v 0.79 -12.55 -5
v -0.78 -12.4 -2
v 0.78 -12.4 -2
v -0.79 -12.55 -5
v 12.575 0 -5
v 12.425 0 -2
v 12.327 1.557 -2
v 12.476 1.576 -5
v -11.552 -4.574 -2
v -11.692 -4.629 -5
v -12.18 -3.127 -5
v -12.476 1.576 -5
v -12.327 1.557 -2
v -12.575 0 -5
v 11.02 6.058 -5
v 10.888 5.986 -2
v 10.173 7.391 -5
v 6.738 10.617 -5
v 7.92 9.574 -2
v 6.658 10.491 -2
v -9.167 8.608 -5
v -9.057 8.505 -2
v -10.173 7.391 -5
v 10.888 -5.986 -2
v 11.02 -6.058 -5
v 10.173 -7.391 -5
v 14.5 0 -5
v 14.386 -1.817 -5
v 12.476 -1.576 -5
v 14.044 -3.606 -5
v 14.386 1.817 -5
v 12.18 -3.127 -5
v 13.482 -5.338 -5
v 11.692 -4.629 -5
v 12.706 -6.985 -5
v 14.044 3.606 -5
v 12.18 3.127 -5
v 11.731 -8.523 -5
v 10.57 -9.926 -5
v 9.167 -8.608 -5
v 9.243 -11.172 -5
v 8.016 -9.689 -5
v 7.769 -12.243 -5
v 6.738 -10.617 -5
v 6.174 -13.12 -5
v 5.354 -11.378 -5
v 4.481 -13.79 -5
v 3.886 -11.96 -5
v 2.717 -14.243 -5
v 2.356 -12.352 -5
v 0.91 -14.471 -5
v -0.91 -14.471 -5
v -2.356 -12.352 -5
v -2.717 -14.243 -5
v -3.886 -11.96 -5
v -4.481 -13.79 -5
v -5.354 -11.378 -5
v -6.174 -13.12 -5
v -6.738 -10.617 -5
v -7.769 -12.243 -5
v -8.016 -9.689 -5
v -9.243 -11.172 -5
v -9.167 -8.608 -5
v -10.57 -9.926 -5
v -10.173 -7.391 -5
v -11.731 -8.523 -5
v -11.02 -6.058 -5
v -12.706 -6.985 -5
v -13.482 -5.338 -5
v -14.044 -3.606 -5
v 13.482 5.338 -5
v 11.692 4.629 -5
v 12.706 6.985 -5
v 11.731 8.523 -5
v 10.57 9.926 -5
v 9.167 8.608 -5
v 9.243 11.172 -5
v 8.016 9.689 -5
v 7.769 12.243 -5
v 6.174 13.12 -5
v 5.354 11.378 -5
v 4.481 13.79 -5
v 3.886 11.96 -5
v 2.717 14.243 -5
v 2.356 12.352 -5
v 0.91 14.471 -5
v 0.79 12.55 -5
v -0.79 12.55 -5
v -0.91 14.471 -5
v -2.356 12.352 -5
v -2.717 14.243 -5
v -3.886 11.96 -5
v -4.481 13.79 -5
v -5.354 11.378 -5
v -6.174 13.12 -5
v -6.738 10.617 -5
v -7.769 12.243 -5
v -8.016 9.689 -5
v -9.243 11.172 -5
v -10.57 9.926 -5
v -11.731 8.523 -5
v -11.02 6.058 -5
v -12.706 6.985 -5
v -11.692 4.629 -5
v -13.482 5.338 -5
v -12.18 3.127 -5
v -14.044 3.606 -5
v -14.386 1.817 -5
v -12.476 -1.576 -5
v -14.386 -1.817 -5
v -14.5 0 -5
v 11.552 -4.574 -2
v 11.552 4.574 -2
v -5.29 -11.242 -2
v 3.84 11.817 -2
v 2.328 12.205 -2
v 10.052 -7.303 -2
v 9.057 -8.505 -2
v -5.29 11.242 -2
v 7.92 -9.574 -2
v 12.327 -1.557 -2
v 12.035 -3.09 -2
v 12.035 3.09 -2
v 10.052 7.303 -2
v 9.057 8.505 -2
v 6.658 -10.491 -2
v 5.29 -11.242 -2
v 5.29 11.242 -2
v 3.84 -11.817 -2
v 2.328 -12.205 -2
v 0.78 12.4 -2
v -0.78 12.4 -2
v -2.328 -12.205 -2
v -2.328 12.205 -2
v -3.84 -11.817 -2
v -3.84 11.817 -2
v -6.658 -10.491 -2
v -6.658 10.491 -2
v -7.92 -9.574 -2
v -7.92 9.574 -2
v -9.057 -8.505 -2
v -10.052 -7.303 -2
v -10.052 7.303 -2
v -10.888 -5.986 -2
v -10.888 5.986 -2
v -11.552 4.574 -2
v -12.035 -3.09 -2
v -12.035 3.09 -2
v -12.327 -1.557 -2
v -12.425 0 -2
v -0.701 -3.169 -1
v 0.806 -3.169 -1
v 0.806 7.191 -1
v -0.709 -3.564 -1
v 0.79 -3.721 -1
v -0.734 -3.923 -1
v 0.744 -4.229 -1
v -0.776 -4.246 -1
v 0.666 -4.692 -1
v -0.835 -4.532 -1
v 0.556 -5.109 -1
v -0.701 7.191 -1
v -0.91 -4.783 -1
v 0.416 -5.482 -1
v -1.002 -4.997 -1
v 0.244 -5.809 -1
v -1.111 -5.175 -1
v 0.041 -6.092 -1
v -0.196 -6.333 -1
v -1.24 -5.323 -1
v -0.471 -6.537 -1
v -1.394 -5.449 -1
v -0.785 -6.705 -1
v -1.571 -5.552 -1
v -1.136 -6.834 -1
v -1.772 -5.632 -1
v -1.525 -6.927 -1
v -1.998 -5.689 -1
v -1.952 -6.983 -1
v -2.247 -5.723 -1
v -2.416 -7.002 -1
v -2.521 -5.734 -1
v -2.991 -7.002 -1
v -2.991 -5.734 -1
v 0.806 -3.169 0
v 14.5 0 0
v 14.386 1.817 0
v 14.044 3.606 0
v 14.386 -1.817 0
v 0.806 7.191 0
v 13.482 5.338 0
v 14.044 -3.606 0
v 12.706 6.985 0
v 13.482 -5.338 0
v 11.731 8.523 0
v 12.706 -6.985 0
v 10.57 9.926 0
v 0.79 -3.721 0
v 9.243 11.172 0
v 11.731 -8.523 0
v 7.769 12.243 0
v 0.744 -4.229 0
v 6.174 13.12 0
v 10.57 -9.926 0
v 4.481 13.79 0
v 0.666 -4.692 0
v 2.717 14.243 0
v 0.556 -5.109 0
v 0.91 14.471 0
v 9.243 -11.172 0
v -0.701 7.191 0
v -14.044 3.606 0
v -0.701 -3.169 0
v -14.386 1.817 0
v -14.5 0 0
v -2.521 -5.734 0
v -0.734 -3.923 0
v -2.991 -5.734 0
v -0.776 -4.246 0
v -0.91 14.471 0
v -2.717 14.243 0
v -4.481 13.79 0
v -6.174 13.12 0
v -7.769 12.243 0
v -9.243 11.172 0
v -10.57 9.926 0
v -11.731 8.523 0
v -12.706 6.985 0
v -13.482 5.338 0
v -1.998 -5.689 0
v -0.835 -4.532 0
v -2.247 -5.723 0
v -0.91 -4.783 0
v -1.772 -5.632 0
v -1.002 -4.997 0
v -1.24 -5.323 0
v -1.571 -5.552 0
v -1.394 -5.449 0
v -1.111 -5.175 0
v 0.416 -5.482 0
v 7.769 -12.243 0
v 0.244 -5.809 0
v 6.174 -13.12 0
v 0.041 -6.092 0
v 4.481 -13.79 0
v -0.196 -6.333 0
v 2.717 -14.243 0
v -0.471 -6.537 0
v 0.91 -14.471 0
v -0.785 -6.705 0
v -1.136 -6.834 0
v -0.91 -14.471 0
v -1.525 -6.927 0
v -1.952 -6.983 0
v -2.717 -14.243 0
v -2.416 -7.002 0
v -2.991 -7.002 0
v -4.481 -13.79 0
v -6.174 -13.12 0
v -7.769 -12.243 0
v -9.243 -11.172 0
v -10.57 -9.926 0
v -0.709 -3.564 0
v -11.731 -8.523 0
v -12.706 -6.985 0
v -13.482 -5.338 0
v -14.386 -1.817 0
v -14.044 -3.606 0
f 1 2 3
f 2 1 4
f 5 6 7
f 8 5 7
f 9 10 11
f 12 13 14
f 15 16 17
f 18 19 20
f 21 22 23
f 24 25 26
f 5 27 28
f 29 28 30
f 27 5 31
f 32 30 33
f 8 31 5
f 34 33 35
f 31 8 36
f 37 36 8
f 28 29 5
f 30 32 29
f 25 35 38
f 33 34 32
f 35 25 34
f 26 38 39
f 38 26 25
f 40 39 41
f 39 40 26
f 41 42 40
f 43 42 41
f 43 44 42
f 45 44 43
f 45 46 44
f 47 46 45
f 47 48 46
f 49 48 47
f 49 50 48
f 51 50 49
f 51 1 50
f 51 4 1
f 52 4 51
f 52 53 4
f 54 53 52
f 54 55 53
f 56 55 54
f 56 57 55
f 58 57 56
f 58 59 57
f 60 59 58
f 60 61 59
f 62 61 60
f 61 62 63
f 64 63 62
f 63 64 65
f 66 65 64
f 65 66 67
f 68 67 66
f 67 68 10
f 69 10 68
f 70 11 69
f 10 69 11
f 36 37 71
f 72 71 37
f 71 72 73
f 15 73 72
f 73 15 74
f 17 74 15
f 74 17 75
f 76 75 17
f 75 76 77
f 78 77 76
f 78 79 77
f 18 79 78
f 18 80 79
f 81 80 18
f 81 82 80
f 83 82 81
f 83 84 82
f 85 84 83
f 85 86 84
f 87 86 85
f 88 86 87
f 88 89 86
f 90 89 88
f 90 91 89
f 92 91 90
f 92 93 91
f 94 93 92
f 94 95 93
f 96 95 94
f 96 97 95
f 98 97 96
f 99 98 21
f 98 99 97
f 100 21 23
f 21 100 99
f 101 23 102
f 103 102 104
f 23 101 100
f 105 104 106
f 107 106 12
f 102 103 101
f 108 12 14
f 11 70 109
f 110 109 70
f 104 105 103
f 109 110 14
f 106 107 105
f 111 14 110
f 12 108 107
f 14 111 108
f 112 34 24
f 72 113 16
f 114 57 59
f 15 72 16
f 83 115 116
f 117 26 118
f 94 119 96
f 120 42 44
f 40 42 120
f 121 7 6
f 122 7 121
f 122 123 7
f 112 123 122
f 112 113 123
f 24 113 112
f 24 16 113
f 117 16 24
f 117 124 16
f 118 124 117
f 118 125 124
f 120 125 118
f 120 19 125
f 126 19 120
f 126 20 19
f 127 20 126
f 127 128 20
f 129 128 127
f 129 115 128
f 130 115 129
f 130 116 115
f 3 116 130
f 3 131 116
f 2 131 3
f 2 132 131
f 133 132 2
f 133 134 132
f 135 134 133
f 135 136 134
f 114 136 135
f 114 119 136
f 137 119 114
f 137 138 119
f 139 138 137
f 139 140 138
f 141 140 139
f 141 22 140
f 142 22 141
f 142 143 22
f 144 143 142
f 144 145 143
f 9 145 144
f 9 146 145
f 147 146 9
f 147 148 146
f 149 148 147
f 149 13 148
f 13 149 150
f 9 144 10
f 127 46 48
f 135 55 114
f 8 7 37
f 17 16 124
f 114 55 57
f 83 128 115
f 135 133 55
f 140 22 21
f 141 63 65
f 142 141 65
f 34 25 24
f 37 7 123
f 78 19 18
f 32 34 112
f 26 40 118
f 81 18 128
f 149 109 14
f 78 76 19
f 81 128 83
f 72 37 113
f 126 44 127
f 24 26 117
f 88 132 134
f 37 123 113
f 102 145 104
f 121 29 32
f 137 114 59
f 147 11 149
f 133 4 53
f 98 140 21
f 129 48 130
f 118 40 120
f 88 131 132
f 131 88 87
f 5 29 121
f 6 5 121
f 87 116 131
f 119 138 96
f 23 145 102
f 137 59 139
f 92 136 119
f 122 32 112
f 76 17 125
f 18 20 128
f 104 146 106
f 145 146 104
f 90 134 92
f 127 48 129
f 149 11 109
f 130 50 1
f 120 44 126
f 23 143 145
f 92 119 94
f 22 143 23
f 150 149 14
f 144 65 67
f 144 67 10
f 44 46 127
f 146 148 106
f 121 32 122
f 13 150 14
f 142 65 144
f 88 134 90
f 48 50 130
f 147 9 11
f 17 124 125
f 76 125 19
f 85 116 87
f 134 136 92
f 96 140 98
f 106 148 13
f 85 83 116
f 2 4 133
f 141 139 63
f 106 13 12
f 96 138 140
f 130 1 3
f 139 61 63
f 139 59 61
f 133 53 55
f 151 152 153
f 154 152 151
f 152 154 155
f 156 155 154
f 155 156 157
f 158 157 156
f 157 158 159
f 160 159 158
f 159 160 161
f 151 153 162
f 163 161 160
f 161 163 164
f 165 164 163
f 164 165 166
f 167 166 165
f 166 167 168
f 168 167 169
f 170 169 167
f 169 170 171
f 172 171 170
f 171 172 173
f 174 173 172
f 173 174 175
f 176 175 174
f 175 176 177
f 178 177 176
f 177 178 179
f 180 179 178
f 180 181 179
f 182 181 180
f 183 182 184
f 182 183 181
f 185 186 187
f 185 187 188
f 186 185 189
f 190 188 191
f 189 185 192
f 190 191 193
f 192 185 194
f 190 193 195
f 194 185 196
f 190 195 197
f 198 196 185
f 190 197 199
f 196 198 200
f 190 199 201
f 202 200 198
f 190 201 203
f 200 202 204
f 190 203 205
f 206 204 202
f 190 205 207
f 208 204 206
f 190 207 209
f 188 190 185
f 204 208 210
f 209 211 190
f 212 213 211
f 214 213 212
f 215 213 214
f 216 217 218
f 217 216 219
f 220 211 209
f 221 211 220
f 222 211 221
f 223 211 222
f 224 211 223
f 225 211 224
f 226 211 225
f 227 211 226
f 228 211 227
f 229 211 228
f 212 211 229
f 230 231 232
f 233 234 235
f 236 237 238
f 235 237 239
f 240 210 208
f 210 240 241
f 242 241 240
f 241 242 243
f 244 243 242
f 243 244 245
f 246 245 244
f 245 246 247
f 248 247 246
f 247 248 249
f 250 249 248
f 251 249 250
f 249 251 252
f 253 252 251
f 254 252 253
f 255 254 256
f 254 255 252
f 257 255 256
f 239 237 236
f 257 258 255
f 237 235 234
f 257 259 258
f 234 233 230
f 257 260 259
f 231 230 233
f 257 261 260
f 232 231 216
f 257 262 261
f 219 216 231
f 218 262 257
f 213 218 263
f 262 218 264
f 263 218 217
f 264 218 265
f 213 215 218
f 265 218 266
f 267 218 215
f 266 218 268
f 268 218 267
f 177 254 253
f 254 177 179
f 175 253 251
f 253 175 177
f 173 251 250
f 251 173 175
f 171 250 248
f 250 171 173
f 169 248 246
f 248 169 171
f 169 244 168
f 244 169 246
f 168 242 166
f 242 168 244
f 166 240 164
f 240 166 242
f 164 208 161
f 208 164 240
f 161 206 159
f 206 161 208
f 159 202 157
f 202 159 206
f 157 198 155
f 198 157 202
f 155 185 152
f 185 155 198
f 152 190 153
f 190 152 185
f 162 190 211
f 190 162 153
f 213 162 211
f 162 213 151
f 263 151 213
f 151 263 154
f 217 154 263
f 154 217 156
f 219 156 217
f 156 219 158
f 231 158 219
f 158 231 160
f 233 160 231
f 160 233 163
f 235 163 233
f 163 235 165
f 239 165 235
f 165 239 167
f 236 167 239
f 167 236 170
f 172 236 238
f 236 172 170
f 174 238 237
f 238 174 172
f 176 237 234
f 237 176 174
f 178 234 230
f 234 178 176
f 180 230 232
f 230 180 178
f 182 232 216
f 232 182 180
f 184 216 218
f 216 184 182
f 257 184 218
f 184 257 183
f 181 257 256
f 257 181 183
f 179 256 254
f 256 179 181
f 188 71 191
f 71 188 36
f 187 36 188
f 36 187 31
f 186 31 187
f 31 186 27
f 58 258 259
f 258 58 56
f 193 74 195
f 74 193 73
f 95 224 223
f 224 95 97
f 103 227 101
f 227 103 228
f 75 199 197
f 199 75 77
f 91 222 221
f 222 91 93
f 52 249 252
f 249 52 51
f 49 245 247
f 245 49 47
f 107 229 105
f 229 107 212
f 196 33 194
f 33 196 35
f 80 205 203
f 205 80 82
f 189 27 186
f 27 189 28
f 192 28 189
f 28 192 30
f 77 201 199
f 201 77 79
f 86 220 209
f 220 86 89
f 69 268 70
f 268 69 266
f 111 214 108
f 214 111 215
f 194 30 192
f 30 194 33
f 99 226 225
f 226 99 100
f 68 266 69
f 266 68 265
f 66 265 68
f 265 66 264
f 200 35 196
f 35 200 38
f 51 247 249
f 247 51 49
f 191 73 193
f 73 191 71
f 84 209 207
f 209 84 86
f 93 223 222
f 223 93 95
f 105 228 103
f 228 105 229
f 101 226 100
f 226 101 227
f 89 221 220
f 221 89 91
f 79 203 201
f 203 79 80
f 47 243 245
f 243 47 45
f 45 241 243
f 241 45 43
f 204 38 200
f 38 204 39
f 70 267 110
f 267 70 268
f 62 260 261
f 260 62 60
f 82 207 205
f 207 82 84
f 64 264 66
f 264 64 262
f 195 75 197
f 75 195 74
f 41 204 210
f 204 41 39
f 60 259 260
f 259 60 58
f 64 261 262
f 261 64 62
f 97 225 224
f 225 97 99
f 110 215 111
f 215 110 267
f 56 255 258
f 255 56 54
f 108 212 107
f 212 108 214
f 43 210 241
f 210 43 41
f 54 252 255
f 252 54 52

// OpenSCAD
$fn = 50;


difference() {
	union() {
		translate(v = [0, 0, -5.0000000000]) {
			cylinder(h = 5, r = 14.5000000000);
		}
	}
	union() {
		#translate(v = [0, 0, -5.0000000000]) {
			cylinder(h = 3, r1 = 12.5750000000, r2 = 12.4250000000);
		}
		translate(v = [0, 0, -1]) {
			linear_extrude(height = 1) {
				text(font = "Wingdings", halign = "center", size = 11, text = "J", valign = "center");
			}
		}
	}
}
